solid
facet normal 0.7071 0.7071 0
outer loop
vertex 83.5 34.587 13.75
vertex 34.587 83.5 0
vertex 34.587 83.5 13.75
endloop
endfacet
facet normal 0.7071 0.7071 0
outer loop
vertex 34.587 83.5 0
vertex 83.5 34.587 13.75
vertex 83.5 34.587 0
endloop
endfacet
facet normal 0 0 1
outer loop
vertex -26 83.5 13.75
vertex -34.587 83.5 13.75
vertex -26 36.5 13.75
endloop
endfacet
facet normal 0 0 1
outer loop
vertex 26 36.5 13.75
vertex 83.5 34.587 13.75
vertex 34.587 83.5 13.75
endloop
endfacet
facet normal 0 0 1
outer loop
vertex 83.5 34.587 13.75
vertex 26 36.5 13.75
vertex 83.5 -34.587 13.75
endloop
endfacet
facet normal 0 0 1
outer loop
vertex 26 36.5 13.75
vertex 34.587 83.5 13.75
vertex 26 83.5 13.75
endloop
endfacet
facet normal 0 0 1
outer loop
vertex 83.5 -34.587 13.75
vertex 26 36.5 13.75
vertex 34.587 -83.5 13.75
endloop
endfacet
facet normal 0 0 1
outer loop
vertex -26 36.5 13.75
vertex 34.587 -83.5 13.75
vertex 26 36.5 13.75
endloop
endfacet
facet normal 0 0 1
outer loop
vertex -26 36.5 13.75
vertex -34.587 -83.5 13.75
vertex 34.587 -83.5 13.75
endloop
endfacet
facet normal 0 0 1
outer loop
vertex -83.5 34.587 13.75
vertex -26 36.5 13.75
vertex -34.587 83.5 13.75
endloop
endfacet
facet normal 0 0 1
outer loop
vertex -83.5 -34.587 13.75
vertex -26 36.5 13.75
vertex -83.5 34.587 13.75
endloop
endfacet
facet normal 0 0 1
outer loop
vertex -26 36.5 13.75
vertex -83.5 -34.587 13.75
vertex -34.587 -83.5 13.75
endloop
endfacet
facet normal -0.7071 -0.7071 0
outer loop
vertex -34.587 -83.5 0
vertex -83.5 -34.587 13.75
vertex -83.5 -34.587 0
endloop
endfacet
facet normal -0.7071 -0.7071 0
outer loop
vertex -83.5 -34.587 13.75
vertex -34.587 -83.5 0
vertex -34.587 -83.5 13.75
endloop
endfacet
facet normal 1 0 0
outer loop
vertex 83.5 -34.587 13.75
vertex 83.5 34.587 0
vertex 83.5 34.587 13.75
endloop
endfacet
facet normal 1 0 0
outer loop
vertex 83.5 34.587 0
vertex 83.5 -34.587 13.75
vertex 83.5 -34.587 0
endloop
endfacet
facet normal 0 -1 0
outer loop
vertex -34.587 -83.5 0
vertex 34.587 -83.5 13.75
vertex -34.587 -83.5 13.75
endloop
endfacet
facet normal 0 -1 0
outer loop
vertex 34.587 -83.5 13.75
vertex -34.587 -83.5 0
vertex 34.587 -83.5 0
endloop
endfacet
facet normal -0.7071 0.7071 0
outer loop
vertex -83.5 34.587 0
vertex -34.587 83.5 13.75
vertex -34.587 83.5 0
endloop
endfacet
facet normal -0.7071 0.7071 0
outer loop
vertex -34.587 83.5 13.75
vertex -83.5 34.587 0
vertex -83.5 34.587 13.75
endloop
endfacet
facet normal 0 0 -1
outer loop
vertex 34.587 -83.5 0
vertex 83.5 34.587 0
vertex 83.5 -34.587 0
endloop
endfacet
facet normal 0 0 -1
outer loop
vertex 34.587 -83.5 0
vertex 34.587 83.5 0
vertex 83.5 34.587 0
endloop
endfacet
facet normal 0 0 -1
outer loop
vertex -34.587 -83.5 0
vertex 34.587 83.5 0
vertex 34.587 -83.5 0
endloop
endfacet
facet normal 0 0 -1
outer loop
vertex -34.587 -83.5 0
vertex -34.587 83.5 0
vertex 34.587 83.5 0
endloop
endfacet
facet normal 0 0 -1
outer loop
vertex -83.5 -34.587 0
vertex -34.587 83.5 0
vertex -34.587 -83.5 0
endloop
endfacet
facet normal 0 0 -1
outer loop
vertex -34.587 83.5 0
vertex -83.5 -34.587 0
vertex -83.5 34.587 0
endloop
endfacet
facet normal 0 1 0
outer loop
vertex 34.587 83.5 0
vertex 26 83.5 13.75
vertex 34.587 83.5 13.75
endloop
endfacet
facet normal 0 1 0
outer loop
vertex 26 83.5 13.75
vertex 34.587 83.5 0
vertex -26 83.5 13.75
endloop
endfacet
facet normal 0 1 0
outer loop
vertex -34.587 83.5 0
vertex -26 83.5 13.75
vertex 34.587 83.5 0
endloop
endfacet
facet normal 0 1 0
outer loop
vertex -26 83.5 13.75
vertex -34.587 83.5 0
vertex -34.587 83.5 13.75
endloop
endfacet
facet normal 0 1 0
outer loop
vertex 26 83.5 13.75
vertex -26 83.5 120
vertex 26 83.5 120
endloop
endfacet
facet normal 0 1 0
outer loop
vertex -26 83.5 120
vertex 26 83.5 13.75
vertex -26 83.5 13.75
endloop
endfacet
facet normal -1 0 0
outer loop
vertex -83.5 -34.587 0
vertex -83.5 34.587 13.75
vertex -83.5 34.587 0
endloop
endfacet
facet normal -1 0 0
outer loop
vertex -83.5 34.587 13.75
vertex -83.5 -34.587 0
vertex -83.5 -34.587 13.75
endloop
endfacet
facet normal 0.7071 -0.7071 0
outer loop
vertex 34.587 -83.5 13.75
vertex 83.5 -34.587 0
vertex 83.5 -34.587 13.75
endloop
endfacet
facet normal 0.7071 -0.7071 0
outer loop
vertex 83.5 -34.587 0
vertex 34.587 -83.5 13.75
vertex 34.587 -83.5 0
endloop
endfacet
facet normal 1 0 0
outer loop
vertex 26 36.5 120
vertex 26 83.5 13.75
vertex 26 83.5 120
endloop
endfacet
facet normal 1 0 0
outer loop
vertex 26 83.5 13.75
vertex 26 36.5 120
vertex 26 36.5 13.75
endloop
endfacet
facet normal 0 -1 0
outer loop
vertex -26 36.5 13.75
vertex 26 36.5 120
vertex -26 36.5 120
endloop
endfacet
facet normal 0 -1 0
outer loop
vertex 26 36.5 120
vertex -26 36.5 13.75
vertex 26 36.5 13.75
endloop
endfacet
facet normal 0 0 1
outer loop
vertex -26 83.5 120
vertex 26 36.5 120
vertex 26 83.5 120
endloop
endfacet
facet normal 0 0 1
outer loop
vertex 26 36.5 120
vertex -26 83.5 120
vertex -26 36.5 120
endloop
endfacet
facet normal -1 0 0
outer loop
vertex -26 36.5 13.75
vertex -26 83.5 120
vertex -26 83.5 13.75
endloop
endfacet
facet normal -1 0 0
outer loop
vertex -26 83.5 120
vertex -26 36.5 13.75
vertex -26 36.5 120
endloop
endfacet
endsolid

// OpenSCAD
// Generated by DescriptiveCAD bootstrap v0.2
  // boundary visualization
  linear_extrude(height=13.75) polygon(points=[[-34.586832, 83.500000], [34.586832, 83.500000], [83.500000, 34.586832], [83.500000, -34.586832], [34.586832, -83.500000], [-34.586832, -83.500000], [-83.500000, -34.586832], [-83.500000, 34.586832]]);
  translate([0,0,0.0]) linear_extrude(height=120.0) polygon(points=[[-26.000000, 83.500000], [26.000000, 83.500000], [26.000000, 36.500000], [-26.000000, 36.500000]]);
